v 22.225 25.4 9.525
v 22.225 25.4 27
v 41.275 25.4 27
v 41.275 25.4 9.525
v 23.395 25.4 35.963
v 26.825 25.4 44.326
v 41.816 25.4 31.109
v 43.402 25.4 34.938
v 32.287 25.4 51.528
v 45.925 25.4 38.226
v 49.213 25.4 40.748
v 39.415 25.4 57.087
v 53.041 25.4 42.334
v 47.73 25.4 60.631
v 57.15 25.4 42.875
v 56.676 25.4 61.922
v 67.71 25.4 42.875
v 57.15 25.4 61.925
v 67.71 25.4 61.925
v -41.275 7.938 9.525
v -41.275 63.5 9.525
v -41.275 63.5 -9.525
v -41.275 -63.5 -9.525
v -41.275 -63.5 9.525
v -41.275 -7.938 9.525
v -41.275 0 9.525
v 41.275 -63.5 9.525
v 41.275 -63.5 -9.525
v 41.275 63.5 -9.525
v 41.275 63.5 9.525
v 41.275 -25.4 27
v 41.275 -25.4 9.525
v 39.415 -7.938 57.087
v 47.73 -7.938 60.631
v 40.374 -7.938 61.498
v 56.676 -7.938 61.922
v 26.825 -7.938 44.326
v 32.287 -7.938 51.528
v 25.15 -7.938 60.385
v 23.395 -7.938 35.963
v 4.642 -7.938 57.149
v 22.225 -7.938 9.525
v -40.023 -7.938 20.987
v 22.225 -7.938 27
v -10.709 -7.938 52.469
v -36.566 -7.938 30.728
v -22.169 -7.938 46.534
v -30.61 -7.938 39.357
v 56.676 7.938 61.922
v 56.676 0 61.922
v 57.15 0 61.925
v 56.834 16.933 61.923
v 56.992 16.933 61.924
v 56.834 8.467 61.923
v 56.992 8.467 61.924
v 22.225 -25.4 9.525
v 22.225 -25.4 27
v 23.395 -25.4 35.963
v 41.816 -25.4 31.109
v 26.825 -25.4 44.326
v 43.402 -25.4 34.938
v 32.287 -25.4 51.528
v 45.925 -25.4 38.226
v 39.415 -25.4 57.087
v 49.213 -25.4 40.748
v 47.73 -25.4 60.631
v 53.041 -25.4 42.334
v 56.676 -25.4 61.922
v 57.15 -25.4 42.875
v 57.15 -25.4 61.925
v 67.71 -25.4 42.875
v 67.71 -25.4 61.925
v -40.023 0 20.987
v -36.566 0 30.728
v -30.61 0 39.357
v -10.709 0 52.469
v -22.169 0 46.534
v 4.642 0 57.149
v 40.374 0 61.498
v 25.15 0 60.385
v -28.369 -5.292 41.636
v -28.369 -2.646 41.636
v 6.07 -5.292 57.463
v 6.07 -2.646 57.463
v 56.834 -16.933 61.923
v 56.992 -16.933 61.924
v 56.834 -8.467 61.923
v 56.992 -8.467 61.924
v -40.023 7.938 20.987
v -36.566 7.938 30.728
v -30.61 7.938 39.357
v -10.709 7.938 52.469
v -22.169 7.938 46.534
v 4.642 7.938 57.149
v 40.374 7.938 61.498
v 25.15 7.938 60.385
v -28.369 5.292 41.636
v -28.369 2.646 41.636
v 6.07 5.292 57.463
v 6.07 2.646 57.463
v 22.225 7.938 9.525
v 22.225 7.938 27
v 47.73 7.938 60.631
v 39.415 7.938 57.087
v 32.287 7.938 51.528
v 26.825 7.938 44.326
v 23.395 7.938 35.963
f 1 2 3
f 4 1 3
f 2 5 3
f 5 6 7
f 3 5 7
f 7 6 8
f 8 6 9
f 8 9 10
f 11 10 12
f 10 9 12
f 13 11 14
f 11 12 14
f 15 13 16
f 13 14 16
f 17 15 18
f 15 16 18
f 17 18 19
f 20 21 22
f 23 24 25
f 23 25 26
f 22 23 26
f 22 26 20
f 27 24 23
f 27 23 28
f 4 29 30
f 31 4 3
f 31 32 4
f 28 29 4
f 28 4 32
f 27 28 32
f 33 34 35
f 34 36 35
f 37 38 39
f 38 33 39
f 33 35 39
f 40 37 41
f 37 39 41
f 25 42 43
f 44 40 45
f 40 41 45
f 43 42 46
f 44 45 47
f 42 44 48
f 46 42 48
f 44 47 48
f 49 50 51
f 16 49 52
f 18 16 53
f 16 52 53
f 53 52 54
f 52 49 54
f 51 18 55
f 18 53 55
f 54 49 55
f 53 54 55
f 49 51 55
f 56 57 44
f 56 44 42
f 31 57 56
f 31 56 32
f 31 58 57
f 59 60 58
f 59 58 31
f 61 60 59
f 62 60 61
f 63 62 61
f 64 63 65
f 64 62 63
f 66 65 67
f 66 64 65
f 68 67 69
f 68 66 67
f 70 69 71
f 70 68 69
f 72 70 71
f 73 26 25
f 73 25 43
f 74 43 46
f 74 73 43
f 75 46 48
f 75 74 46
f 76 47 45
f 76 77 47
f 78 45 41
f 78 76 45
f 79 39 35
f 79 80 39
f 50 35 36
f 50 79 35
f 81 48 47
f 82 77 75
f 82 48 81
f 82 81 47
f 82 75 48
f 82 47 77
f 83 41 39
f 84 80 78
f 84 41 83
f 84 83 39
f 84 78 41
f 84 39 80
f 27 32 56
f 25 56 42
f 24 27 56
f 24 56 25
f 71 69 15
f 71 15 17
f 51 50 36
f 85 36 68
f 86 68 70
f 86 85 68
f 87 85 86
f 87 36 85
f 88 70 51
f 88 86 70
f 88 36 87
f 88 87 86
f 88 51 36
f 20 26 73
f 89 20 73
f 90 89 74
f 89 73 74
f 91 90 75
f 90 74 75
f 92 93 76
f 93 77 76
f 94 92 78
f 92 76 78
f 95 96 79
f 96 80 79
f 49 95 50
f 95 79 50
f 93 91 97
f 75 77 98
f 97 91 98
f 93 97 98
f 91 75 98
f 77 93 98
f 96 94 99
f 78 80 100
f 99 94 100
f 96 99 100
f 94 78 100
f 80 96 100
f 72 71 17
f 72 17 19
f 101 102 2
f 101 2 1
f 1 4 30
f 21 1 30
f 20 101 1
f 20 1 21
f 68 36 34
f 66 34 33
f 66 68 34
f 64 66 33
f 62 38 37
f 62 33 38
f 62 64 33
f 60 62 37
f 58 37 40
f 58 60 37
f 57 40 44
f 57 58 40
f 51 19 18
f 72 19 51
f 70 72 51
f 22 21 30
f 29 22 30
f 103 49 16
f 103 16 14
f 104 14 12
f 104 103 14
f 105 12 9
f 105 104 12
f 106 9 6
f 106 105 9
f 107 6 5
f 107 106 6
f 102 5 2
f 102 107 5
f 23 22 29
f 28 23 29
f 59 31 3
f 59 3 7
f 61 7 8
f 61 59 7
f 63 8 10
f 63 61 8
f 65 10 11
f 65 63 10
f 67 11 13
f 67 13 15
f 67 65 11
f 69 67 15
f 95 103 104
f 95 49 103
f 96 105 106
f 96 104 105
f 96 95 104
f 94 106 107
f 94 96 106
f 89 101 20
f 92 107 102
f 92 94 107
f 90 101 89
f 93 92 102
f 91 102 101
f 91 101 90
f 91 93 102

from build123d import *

# Parameters (mm, degrees)
F1_DEPTH = 63.5
F2_DEPTH = 25.4
F3_DEPTH = 7.9375


with BuildPart() as f1:
    # F0 (on Front) → F1 (new body, symmetric)
    with BuildSketch(Plane.XZ):
        Polygon((22.225, 9.525), (-41.275, 9.525), (-41.275, -9.525), (41.275, -9.525), (41.275, 9.525), align=None)
    extrude(amount=F1_DEPTH, both=True)

    # F0 (on Front) → F2 (join, symmetric)
    with BuildSketch(Plane.XZ):
        with BuildLine():
            Line((22.225, 27.0002), (22.225, 9.525))
            Line((22.225, 9.525), (41.275, 9.525))
            Line((41.275, 9.525), (41.275, 27.0002))
            ThreePointArc((41.275, 27.0002), (45.92468, 38.22552), (57.15, 42.8752))
            Line((57.15, 42.8752), (67.710114, 42.8752))
            Line((67.710114, 42.8752), (67.710114, 61.9252))
            Line((67.710114, 61.9252), (57.15, 61.9252))
            add(Edge.make_bspline(
                [(56.676443, 61.921989), (56.834171, 61.923134), (56.992024, 61.924204), (57.15, 61.9252)],
                knots=[111.196311, 111.196311, 111.196311, 111.196311, 111.504536, 111.504536, 111.504536, 111.504536], degree=3))
            ThreePointArc((56.676443, 61.921989), (32.287432, 51.527905), (22.225, 27.0002))
        make_face()
    extrude(amount=F2_DEPTH, both=True)

    # F0 (on Front) → F3 (join, symmetric)
    with BuildSketch(Plane.XZ):
        with BuildLine():
            add(Edge.make_bspline(
                [(-41.275, 9.525), (-40.923248, 51.417116), (-0.225928, 61.509118), (56.676443, 61.921989)],
                knots=[0, 0, 0, 0, 111.196311, 111.196311, 111.196311, 111.196311], degree=3))
            Line((-41.275, 9.525), (22.225, 9.525))
            Line((22.225, 9.525), (22.225, 27.0002))
            ThreePointArc((22.225, 27.0002), (32.287432, 51.527905), (56.676443, 61.921989))
        make_face()
    extrude(amount=F3_DEPTH, both=True)


solid = f1.part
